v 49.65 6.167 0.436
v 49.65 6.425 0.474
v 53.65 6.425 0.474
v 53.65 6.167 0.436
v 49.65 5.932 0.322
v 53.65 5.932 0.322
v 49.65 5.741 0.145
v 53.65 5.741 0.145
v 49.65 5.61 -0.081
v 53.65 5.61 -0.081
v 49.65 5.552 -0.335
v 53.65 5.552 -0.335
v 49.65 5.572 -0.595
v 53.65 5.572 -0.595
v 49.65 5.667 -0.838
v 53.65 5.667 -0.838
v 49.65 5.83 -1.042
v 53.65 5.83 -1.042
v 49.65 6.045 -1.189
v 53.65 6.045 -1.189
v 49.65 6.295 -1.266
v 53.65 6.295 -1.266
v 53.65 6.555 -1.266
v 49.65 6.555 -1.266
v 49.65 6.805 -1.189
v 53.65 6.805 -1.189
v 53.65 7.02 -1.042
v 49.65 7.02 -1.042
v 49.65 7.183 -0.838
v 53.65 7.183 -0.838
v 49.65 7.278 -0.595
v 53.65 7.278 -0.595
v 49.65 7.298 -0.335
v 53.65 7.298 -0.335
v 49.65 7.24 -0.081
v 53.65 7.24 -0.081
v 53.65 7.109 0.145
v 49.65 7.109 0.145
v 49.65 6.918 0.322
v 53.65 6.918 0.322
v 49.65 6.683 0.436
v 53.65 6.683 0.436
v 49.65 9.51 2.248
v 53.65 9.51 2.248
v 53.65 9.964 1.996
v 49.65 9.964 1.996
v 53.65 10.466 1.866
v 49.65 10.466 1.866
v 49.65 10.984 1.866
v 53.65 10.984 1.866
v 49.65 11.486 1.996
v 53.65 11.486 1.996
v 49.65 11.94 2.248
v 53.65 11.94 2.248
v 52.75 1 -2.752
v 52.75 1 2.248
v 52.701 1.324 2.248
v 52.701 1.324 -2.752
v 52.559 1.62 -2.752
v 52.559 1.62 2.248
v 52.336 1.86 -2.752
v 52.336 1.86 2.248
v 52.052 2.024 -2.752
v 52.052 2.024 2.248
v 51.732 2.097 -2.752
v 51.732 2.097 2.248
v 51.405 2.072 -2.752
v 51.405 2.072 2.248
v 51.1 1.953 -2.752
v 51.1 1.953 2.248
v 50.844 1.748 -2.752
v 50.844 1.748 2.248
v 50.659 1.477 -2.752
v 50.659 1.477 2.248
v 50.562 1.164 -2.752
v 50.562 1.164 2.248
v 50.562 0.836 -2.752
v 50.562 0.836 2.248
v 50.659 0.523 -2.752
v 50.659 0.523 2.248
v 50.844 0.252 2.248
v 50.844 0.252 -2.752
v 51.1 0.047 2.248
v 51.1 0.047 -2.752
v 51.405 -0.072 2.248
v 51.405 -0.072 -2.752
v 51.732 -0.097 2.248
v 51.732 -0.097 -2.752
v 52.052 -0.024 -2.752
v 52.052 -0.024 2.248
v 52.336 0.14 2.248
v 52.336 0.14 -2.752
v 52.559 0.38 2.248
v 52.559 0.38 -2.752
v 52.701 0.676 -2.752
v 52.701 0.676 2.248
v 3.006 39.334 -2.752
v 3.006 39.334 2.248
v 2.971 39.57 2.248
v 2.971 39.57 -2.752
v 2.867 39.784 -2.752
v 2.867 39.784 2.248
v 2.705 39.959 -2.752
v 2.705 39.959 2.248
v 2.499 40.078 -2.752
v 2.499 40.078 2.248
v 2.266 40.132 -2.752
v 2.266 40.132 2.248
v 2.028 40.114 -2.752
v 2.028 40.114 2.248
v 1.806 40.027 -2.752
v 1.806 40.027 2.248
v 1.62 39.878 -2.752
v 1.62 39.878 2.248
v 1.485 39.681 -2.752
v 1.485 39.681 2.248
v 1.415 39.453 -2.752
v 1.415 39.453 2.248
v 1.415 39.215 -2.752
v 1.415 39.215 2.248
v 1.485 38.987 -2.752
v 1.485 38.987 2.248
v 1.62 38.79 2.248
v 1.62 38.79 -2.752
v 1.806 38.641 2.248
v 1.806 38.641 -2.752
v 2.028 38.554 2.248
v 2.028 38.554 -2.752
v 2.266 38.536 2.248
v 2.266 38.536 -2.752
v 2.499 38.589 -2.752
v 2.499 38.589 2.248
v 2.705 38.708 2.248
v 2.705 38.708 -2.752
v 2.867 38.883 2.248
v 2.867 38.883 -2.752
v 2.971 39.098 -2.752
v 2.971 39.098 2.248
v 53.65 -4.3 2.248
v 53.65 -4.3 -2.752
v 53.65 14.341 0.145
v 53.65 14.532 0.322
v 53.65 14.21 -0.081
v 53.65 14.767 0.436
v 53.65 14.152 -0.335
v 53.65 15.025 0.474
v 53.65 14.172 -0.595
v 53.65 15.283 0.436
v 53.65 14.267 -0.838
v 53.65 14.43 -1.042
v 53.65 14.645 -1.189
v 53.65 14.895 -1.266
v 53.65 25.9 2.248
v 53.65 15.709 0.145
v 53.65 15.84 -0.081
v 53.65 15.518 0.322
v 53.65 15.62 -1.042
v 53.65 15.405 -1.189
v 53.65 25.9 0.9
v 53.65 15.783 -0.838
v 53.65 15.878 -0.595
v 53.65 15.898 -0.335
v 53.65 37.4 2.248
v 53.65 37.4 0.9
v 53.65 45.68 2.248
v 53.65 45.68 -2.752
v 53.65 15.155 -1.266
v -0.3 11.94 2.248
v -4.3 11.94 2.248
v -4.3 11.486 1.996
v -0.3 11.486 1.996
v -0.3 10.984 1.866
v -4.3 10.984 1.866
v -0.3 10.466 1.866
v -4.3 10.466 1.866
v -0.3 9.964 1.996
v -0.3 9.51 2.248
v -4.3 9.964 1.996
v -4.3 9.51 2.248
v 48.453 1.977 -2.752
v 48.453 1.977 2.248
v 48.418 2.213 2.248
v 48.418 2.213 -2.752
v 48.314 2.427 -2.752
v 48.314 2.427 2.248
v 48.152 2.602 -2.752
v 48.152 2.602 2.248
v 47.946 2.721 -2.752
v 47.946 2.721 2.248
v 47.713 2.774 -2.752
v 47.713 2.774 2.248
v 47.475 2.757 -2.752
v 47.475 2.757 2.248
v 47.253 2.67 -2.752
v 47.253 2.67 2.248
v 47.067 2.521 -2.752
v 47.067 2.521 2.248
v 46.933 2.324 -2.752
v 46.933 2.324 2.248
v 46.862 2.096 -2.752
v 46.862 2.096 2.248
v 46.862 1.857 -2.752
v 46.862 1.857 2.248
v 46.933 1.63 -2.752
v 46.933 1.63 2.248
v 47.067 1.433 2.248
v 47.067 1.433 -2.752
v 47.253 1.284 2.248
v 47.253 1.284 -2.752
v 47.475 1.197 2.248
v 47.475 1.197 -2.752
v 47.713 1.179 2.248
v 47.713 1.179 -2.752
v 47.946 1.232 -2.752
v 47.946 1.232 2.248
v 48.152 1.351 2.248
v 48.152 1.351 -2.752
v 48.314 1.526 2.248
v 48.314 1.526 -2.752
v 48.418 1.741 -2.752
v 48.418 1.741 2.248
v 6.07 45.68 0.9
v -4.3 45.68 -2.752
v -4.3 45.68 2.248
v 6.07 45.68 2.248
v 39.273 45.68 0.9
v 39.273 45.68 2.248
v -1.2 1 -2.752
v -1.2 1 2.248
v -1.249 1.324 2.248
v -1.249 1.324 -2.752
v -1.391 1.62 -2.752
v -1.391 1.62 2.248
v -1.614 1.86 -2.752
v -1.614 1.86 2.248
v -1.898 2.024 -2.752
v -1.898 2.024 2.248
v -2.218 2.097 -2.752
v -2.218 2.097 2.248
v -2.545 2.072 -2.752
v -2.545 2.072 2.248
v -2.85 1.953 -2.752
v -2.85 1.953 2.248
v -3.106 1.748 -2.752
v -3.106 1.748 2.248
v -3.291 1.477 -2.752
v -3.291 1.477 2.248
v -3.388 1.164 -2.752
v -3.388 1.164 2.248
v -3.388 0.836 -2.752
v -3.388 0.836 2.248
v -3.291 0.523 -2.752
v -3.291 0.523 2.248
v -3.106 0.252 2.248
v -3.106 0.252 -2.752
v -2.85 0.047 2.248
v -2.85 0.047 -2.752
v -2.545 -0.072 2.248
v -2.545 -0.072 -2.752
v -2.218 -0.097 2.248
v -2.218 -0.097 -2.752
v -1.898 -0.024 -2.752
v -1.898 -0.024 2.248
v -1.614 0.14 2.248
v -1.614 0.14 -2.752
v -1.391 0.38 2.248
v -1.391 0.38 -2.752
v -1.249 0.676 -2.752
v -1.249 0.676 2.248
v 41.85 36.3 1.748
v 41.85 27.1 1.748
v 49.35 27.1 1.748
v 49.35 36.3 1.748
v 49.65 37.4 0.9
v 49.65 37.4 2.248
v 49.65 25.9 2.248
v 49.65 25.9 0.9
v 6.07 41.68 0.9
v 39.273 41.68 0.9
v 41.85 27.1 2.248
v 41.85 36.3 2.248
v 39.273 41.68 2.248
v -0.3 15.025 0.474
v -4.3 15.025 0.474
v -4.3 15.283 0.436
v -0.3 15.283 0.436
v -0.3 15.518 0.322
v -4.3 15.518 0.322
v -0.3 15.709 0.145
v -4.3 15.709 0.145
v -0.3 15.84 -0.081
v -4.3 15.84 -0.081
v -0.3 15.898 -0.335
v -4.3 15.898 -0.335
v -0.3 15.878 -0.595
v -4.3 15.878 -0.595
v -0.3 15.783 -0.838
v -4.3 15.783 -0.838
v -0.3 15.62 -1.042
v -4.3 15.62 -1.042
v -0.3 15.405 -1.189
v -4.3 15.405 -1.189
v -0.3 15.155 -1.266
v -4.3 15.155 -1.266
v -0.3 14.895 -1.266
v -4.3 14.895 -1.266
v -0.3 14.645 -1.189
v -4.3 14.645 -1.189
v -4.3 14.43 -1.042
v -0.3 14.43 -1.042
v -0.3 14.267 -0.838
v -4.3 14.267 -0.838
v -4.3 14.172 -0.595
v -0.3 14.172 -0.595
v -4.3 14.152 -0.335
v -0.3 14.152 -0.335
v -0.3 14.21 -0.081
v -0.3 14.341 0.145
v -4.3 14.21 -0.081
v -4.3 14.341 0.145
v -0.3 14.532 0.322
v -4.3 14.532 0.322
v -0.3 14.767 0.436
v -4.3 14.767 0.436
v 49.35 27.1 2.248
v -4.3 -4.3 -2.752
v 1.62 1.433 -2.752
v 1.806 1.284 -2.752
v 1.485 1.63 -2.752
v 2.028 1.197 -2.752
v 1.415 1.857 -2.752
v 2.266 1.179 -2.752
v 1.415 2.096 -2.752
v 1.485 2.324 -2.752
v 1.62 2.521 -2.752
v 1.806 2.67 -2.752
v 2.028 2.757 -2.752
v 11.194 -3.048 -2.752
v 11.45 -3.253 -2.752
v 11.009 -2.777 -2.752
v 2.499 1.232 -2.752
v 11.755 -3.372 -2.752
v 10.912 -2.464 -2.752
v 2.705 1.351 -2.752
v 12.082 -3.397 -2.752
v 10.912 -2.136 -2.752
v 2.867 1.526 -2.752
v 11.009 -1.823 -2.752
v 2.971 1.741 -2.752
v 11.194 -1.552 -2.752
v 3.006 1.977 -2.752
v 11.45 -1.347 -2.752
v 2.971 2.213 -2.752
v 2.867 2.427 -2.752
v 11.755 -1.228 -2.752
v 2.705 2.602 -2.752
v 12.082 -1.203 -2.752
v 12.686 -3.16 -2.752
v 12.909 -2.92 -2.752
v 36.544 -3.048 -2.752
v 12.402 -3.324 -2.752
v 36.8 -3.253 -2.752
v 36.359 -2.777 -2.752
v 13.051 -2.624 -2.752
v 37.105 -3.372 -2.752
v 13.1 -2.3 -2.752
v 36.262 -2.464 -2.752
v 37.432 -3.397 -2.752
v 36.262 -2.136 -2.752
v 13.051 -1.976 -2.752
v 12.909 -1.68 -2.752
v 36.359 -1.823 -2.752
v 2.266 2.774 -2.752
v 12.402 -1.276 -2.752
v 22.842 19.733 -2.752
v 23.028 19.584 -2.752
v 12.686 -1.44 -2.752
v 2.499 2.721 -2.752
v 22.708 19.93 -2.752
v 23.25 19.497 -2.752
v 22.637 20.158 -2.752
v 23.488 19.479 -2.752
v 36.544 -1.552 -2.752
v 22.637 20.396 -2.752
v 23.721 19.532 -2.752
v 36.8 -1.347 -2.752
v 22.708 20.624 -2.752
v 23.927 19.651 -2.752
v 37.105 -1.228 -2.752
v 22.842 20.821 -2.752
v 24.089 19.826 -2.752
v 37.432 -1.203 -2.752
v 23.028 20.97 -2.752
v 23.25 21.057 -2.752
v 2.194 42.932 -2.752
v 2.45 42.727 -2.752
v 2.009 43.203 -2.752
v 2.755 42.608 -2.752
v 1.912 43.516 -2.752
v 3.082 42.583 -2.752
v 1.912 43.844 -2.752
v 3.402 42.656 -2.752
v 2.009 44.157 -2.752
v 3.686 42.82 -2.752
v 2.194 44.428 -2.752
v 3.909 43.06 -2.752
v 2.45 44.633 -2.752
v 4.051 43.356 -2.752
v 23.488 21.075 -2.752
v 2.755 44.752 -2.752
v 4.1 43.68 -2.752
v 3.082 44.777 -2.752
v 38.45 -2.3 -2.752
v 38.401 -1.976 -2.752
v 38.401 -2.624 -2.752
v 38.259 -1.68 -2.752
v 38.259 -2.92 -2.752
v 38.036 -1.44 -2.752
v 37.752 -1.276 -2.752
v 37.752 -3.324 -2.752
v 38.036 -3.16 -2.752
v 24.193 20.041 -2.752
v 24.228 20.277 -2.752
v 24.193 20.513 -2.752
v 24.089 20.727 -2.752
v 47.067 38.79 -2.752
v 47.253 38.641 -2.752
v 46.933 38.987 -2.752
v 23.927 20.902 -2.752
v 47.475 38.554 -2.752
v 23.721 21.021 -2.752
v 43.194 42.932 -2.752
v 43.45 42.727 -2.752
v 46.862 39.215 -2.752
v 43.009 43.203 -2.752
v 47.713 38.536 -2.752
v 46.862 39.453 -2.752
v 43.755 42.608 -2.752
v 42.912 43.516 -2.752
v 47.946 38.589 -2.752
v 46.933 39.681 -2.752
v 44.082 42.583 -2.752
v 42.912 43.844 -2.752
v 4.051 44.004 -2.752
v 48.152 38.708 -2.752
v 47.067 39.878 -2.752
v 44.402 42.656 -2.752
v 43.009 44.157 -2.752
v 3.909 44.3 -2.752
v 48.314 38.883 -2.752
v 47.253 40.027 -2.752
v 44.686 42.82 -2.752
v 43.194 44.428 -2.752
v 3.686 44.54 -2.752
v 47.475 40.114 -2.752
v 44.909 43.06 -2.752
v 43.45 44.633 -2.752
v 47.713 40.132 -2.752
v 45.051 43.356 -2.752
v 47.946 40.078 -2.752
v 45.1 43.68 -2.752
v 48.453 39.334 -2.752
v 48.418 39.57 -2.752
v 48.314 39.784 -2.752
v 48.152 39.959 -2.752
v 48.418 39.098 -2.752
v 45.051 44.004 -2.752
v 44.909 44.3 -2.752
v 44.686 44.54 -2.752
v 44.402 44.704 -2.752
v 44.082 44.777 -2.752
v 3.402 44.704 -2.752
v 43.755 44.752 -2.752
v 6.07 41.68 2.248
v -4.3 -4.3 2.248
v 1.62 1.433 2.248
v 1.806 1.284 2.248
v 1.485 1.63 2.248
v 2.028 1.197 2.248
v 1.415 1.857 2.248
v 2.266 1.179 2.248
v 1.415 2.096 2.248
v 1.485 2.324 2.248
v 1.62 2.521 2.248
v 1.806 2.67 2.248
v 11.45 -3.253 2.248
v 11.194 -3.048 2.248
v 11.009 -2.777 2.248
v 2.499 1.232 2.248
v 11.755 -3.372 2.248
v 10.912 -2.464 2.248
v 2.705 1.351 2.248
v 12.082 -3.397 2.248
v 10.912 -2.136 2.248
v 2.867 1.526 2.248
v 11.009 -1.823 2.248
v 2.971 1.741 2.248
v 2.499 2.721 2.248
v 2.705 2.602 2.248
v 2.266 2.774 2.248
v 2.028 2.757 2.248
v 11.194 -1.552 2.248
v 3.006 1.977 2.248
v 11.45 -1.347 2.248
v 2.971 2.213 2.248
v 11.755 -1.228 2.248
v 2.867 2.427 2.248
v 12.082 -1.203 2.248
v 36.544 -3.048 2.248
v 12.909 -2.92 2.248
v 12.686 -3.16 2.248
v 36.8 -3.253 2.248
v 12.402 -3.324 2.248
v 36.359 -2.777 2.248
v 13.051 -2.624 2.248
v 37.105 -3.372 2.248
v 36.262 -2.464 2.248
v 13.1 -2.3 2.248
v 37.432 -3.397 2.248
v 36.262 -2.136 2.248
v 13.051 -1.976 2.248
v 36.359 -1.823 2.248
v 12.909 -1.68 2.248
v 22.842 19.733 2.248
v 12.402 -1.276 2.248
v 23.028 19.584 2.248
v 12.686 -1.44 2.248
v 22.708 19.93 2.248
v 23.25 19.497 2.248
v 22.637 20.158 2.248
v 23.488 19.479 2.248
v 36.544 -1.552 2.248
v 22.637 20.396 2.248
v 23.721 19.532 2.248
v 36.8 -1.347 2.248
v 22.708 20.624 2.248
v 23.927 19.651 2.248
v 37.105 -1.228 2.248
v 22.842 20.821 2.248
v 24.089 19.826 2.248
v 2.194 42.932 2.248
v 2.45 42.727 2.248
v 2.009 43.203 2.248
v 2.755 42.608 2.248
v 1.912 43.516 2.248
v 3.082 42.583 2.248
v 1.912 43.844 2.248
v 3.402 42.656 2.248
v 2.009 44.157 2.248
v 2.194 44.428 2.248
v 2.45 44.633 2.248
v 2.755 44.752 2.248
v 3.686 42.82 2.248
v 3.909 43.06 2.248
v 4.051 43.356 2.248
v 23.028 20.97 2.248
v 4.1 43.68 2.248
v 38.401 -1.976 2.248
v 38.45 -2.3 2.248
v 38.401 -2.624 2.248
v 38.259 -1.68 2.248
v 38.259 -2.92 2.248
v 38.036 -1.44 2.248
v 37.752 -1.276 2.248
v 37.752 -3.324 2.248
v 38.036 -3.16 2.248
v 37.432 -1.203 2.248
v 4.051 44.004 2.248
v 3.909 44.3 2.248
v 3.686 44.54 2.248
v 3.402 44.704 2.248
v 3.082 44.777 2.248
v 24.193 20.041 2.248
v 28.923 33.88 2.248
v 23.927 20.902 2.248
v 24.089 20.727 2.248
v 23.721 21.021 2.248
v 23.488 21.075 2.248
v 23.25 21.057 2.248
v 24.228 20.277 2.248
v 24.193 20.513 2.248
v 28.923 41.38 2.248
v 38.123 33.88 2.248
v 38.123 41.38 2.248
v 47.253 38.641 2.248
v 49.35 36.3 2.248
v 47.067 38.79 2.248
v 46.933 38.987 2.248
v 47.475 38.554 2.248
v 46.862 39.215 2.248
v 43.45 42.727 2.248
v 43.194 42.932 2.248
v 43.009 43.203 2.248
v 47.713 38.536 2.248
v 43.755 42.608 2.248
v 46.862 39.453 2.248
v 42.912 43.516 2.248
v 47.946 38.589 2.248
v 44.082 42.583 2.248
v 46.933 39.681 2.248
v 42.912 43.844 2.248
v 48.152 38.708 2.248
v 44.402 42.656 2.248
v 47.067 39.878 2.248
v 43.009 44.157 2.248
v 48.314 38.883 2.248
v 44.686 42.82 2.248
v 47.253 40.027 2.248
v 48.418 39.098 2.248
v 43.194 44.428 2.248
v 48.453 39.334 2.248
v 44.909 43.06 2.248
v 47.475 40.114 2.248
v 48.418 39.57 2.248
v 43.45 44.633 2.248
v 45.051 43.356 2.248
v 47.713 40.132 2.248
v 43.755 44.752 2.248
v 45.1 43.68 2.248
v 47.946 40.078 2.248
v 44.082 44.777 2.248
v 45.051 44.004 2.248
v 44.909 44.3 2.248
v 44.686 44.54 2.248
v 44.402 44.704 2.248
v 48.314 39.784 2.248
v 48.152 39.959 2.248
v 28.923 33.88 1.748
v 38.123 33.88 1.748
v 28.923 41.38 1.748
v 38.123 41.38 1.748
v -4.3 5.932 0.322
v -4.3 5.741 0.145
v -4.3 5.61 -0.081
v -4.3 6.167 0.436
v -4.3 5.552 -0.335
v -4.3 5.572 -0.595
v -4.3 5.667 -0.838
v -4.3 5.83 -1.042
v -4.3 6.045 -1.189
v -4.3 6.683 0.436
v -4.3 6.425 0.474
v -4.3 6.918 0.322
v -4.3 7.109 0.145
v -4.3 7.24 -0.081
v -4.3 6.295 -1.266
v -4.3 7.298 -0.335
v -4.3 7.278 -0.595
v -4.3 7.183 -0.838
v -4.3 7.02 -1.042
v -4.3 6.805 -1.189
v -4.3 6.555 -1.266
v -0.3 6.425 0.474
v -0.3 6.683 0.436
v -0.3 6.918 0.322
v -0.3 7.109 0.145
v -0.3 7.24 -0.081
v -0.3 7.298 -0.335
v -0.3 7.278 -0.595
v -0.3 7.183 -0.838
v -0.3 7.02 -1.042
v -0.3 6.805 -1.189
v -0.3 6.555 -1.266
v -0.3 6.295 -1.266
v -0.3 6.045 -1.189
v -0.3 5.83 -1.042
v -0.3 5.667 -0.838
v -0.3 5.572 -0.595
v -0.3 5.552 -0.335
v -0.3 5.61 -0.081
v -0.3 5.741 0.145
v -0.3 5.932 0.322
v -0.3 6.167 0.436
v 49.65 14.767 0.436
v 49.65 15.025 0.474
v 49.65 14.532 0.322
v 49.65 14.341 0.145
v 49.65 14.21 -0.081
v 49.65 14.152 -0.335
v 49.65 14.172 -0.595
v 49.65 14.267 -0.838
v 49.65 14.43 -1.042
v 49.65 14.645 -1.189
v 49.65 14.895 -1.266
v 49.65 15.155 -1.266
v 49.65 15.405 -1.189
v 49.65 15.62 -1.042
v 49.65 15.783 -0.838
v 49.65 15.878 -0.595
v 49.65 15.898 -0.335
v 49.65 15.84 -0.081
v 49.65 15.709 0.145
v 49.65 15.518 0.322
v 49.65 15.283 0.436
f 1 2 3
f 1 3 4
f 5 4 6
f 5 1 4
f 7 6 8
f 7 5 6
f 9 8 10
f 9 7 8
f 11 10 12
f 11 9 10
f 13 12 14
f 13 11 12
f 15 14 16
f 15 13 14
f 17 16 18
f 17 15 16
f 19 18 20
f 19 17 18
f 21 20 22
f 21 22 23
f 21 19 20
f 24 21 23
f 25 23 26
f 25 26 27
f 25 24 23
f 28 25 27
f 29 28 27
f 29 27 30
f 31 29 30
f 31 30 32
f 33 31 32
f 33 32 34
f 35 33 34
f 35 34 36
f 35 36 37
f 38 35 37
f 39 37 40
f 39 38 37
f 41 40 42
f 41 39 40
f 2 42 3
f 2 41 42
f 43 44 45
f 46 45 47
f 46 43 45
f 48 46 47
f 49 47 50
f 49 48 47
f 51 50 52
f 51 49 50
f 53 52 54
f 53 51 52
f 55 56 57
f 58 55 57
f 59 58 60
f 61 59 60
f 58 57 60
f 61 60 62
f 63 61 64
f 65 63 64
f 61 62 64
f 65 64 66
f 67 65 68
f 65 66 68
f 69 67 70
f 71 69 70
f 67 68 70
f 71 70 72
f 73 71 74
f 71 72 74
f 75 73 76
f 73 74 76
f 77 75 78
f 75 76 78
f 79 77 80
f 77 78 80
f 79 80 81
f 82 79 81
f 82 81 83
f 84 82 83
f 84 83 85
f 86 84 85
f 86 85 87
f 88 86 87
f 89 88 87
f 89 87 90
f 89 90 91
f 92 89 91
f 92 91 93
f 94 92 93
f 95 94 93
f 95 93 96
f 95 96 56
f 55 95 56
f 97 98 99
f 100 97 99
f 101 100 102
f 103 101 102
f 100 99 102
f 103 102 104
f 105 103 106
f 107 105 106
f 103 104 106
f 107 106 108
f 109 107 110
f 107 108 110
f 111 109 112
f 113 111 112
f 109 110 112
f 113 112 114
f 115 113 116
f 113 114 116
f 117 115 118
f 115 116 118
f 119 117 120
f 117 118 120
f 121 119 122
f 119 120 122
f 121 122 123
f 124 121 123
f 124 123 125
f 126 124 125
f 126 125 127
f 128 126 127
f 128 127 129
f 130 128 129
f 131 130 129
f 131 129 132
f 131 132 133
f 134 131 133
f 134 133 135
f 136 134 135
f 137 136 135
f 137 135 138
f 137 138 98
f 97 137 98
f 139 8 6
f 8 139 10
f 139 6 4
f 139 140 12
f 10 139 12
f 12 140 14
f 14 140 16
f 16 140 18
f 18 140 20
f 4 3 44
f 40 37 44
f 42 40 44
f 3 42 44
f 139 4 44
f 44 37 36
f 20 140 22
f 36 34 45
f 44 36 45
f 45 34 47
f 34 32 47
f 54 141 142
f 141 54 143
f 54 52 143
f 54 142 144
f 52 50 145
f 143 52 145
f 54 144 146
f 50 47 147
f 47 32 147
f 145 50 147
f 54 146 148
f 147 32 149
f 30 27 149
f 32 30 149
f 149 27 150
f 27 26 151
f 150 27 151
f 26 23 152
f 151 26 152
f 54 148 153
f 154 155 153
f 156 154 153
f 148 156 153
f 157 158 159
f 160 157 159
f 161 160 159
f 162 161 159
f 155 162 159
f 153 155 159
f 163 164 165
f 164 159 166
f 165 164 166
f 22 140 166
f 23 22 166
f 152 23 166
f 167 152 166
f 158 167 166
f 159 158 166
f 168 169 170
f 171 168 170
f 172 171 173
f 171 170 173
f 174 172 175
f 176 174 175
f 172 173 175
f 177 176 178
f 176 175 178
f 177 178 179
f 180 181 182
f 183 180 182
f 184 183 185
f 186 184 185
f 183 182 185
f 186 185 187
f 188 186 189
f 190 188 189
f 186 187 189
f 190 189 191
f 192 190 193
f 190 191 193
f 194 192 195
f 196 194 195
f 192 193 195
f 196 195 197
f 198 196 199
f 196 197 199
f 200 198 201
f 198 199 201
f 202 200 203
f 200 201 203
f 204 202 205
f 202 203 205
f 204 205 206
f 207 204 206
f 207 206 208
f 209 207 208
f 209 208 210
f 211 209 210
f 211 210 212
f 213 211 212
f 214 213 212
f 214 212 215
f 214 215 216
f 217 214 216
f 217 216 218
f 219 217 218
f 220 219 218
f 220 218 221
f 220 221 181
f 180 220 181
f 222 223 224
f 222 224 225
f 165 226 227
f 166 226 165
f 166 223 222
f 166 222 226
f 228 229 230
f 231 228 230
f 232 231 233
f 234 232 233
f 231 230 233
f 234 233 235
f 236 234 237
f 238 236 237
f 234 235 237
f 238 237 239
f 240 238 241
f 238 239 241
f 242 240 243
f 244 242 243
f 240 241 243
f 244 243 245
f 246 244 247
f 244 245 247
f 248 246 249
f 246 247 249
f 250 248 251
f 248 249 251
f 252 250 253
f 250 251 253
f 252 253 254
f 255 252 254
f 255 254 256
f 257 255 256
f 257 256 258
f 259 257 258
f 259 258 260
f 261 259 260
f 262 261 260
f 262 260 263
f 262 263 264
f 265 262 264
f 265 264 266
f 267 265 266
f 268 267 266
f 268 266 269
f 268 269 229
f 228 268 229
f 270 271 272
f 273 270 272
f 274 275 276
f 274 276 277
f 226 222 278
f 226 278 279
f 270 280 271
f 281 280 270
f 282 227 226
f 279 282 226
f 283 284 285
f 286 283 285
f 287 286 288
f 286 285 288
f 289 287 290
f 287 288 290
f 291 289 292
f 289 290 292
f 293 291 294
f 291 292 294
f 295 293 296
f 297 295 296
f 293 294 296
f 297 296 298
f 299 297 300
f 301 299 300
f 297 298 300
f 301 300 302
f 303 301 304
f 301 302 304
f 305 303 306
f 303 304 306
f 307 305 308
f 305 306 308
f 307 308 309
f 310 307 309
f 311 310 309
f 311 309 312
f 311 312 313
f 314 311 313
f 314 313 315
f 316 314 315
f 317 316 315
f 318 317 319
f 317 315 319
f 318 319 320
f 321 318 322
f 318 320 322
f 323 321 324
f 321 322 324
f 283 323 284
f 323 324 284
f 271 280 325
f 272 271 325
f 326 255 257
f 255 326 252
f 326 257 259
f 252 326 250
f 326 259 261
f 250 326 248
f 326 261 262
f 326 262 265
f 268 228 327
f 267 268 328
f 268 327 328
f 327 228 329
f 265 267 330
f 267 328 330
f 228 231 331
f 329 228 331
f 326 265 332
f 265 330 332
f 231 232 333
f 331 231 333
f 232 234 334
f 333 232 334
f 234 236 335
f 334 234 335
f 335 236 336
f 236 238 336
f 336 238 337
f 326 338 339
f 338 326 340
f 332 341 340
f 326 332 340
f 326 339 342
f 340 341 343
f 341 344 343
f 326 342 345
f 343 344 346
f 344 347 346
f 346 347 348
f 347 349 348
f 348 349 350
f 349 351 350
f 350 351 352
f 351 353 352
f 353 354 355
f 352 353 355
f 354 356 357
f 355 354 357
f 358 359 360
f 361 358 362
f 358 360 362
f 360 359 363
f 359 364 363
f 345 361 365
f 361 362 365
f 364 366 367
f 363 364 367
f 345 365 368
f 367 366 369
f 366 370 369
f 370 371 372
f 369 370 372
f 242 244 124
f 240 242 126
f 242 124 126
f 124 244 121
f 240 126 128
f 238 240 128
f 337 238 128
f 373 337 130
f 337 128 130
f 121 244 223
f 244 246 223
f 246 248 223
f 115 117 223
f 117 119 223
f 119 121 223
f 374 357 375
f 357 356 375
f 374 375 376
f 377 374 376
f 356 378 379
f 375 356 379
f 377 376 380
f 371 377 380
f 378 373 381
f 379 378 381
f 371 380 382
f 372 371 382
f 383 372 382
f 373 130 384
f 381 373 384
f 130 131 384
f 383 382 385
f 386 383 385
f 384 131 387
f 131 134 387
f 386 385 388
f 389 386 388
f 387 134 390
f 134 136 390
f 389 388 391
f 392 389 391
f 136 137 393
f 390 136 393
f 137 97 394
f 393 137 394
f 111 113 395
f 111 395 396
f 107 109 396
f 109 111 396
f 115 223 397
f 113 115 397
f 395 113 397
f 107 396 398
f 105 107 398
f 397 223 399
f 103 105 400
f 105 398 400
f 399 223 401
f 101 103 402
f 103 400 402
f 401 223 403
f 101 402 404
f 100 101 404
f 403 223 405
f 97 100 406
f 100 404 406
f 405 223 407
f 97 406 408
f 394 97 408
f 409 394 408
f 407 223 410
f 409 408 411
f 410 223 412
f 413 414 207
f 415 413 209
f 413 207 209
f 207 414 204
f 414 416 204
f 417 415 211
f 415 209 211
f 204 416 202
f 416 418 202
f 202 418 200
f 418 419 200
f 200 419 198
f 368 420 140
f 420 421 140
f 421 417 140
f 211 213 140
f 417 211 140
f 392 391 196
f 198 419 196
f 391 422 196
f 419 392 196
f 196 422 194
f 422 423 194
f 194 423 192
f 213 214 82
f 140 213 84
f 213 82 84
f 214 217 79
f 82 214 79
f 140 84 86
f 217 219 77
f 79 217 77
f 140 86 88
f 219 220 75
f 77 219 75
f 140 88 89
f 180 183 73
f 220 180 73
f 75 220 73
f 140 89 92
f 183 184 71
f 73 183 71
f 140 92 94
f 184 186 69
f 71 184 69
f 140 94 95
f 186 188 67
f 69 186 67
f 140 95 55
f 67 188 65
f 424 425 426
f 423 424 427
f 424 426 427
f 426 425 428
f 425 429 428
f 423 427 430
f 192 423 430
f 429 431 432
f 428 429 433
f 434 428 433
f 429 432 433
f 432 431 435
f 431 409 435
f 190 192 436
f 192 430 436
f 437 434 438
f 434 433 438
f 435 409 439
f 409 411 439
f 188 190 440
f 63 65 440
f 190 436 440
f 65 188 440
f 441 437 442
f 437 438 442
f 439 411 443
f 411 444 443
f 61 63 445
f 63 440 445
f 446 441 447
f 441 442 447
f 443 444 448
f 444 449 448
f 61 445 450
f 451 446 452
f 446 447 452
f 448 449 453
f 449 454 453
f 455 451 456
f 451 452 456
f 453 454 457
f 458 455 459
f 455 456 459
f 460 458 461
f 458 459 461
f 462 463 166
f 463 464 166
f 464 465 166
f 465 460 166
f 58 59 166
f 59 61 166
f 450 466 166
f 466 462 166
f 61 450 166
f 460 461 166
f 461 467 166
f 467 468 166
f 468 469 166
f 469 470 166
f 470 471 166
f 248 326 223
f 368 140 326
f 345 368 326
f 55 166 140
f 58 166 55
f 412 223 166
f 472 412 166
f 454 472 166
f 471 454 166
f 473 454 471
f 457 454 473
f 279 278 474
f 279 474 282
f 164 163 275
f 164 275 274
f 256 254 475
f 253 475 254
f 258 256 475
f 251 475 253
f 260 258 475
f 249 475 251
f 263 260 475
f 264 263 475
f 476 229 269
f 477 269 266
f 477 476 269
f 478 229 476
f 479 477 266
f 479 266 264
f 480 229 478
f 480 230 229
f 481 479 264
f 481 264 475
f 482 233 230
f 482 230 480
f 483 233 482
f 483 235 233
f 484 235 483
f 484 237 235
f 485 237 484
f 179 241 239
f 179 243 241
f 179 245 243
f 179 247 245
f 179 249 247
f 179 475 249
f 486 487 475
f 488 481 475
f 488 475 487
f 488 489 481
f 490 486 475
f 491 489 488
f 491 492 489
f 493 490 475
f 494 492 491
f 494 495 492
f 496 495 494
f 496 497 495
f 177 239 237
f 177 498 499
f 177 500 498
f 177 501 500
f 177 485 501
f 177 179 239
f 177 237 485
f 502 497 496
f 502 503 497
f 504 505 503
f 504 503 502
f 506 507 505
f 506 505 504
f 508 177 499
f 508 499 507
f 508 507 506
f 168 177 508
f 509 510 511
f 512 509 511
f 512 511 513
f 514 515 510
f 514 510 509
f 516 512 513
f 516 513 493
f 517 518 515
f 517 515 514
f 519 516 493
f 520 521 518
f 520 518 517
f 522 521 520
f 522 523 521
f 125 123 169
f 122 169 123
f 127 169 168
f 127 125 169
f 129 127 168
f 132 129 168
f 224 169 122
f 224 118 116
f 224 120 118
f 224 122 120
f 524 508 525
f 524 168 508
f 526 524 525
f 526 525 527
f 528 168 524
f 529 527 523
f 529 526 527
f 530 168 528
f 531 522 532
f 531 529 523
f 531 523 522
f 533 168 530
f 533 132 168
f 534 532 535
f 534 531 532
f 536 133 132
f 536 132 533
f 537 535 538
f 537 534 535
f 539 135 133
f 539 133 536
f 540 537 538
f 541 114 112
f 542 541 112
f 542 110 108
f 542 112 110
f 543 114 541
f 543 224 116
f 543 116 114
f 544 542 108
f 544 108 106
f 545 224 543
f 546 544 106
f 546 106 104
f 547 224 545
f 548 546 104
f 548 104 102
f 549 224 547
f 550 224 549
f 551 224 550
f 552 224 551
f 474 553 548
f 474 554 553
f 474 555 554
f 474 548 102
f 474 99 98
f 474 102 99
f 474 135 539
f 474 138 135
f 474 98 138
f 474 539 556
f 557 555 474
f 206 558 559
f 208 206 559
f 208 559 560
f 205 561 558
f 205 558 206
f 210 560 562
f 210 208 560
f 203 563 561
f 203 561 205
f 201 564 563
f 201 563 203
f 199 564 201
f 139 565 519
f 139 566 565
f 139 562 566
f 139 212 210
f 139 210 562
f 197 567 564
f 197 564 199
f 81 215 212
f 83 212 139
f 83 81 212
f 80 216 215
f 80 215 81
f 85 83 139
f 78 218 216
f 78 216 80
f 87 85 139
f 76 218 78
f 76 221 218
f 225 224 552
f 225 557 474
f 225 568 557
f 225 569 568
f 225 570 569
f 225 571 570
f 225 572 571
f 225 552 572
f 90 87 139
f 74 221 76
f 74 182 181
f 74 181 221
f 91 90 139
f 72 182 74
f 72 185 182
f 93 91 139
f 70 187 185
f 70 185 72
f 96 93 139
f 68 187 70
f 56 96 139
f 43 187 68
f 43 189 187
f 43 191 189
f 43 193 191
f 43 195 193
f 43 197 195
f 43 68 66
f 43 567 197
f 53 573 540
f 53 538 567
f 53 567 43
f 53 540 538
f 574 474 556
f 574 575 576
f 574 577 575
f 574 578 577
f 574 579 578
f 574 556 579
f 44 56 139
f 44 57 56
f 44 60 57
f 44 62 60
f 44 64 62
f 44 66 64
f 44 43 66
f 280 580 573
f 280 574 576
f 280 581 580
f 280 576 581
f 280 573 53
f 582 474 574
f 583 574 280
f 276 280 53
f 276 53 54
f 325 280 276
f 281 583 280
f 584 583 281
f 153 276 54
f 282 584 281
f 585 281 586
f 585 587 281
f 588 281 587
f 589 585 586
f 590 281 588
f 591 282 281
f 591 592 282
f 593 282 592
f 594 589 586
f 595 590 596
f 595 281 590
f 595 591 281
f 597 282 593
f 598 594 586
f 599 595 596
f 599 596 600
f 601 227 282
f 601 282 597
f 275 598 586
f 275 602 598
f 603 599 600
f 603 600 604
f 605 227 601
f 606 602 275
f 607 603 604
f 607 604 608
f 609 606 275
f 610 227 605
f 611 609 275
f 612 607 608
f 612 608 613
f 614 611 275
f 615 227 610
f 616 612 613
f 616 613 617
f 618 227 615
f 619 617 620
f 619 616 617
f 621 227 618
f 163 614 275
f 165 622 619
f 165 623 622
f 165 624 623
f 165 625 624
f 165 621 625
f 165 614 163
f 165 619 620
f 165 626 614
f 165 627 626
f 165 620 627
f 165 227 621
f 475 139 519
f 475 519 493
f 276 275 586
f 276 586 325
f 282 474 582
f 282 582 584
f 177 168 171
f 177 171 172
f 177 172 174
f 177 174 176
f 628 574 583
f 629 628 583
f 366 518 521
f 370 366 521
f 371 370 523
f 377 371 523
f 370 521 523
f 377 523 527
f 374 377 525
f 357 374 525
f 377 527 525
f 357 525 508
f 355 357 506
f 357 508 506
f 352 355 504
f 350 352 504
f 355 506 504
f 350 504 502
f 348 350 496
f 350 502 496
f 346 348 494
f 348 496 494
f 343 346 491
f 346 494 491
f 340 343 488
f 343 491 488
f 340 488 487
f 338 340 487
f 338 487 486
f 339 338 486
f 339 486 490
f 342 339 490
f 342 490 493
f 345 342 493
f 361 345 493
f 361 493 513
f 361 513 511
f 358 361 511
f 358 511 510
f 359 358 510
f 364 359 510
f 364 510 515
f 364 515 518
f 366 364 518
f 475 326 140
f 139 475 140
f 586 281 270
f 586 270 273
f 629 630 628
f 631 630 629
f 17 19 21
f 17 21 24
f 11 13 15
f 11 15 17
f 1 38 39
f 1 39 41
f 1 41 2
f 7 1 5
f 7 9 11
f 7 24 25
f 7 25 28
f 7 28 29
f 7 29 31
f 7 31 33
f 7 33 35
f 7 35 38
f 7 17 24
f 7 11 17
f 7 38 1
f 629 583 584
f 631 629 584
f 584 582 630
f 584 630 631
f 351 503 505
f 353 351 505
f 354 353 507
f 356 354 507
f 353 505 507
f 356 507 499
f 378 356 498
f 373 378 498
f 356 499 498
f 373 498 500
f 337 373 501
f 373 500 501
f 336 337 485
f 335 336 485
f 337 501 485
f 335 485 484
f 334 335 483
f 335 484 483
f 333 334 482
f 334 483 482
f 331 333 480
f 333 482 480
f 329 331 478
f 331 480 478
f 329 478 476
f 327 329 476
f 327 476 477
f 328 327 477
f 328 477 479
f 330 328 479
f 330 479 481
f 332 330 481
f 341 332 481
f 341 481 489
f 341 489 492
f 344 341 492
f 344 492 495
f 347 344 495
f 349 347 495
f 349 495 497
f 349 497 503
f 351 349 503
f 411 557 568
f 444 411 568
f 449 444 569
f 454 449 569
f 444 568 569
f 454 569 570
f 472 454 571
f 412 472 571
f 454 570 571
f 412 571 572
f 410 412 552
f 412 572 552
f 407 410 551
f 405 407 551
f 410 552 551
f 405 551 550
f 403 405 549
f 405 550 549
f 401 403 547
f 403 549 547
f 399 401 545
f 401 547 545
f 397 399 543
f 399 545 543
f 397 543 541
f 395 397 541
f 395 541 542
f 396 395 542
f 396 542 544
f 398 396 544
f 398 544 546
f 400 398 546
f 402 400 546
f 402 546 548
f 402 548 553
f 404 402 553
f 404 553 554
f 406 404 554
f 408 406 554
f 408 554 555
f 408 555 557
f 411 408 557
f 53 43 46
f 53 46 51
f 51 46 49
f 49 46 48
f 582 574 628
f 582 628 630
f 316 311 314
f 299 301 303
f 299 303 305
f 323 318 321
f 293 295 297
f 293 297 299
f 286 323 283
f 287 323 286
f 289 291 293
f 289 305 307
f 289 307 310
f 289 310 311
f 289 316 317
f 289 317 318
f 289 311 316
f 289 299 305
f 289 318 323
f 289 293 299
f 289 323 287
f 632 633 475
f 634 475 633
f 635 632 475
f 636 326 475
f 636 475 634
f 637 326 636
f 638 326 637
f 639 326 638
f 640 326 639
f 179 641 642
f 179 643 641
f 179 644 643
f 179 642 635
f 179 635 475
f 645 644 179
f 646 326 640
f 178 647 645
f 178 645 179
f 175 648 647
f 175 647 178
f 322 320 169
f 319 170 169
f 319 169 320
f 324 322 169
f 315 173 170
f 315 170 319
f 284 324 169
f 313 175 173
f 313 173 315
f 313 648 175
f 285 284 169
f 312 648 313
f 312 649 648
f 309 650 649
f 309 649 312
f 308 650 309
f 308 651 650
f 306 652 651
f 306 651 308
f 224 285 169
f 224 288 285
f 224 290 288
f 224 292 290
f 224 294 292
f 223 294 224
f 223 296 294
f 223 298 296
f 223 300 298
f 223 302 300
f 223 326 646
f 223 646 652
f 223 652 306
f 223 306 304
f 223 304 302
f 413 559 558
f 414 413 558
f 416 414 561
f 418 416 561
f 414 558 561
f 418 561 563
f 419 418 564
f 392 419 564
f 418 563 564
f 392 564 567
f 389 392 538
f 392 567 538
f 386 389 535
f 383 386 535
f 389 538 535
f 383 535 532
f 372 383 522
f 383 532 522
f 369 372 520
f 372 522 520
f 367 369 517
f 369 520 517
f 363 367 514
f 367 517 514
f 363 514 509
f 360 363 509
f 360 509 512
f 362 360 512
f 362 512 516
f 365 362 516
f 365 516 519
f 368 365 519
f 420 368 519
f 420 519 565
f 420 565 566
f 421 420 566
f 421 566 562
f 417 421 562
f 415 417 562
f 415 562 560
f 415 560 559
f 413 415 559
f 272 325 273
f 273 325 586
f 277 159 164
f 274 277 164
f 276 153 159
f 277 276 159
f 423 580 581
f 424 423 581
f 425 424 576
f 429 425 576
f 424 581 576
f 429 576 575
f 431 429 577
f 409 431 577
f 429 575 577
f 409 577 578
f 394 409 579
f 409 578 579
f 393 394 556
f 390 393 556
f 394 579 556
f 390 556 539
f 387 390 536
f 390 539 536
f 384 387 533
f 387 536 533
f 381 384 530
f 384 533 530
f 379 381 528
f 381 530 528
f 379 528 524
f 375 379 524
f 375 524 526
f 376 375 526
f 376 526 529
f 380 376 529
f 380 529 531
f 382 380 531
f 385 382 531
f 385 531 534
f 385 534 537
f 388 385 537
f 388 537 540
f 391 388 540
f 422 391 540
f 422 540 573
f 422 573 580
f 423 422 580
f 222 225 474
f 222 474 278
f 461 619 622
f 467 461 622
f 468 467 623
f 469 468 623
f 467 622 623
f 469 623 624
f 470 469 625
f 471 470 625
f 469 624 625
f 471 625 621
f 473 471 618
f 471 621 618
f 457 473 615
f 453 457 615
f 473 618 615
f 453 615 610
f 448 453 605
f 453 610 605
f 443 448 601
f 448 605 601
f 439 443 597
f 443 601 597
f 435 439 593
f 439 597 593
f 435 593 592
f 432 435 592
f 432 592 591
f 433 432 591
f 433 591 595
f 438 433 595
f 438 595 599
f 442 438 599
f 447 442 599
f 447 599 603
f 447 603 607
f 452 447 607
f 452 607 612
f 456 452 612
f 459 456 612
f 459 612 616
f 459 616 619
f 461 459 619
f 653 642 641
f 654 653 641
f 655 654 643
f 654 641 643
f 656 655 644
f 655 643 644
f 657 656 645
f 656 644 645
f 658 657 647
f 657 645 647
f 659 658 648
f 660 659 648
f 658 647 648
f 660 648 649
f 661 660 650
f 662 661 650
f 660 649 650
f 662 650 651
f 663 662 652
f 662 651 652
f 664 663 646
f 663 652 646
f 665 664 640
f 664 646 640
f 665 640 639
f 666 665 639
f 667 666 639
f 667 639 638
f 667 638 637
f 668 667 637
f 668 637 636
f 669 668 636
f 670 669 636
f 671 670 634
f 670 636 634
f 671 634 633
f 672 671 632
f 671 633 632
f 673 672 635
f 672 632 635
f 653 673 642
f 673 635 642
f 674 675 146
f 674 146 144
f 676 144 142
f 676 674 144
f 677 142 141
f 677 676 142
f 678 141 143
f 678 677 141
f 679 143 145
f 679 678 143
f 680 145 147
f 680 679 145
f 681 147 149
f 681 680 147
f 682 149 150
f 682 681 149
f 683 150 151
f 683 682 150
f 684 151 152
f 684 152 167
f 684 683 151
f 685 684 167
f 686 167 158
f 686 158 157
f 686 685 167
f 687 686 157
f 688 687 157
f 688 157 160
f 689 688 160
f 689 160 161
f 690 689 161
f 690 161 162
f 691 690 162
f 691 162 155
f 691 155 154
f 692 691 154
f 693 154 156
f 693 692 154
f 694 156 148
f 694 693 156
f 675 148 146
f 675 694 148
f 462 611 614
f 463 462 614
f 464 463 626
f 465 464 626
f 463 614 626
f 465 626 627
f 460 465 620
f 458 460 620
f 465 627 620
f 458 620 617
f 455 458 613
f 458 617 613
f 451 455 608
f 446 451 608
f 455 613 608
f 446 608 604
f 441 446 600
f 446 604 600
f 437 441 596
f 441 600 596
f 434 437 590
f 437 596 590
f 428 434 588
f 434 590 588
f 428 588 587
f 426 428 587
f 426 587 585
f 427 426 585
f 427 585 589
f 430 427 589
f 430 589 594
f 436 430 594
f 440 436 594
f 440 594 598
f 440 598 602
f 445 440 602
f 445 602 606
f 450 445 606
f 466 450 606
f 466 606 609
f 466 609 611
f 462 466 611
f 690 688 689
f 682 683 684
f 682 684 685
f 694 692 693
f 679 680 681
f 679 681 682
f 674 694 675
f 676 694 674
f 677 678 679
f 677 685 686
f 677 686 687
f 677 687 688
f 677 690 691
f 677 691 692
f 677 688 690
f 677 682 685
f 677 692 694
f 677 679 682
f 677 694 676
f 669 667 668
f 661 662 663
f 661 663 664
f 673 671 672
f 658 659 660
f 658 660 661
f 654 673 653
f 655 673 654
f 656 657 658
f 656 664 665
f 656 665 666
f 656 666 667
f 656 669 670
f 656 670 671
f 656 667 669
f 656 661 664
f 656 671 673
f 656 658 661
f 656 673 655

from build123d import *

# Parameters (mm, degrees)
MAIN_STOCK_START                 = -2.751909566
SKETCH_1_W                       = 57.95
SKETCH_1_H                       = 49.98
MAIN_STOCK_DEPTH                 = 5
SKETCH_2_R                       = 1.1
FRAME_6XD2P2_THROUGH_DEPTH       = 71.63982517
SKETCH_3_R                       = 0.8
PCB_5XD1P6_M2_THROUGH_DEPTH      = 71.63982517
SKETCH_4_R                       = 2.05
SMA_L_CENTER_MATCHING_ARC_DEPTH  = 4
SKETCH_5_R                       = 0.875
SMA_L_LOWER_2XD1P75_BLIND4_DEPTH = 4
SMA_R_CENTER_MATCHING_ARC_START  = -4
SKETCH_6_R                       = 2.05
SMA_R_CENTER_MATCHING_ARC_DEPTH  = 4
SMA_R_LOWER_2XD1P75_BLIND4_START = -4
SKETCH_7_R                       = 0.875
SMA_R_LOWER_2XD1P75_BLIND4_DEPTH = 4
SKETCH_8_W                       = 6.7
SKETCH_8_H                       = 11.5
RIGHT_TYPEC_WINDOW_LOWER_DEPTH   = 4
SKETCH_9_W                       = 33.203
SKETCH_9_H                       = 6.7
REAR_WINDOW_LOWER_DEPTH          = 4
SKETCH_10_W                      = 7.5
SKETCH_10_H                      = 9.2
TYPEC_BOTTOM_RECESS_A_DEPTH      = 0.5
SKETCH_11_W                      = 9.2
SKETCH_11_H                      = 7.5
TYPEC_BOTTOM_RECESS_B_DEPTH      = 0.5


with BuildPart() as part:
    # 草图1 → Main_Stock (new body)
    with BuildSketch(Plane.XY.offset(MAIN_STOCK_START)):
        with Locations((24.675, 20.69)):
            Rectangle(SKETCH_1_W, SKETCH_1_H)
    extrude(amount=MAIN_STOCK_DEPTH)

    # 草图2 → Frame_6xD2p2_Through (cut, through all)
    with BuildSketch(Plane.XY.offset(2.248090434)):
        with Locations((-2.3, 1)):
            Circle(SKETCH_2_R)
        with Locations((51.65, 1)):
            Circle(SKETCH_2_R)
        with Locations((12, -2.3)):
            Circle(SKETCH_2_R)
        with Locations((37.35, -2.3)):
            Circle(SKETCH_2_R)
        with Locations((3, 43.68)):
            Circle(SKETCH_2_R)
        with Locations((44, 43.68)):
            Circle(SKETCH_2_R)
    extrude(amount=-FRAME_6XD2P2_THROUGH_DEPTH, mode=Mode.SUBTRACT)

    # 草图3 → PCB_5xD1p6_M2_Through (cut, through all)
    with BuildSketch(Plane.XY.offset(2.248090434)):
        with Locations((23.428293927, 20.276755792)):
            Circle(SKETCH_3_R)
        with Locations((2.206251763, 39.333791606)):
            Circle(SKETCH_3_R)
        with Locations((47.653340917, 39.333791606)):
            Circle(SKETCH_3_R)
        with Locations((47.653340917, 1.976720232)):
            Circle(SKETCH_3_R)
        with Locations((2.206251763, 1.976720232)):
            Circle(SKETCH_3_R)
    extrude(amount=-PCB_5XD1P6_M2_THROUGH_DEPTH, mode=Mode.SUBTRACT)

    # 草图4 → SMA_L_Center_Matching_Arc (cut)
    with BuildSketch(Plane.ZY.offset(4.3)):
        with Locations((3.899496327, 10.725)):
            Circle(SKETCH_4_R)
    extrude(amount=-SMA_L_CENTER_MATCHING_ARC_DEPTH, mode=Mode.SUBTRACT)

    # 草图5 → SMA_L_Lower_2xD1p75_Blind4 (cut)
    with BuildSketch(Plane.ZY.offset(4.3)):
        with Locations((-0.400503673, 6.425)):
            Circle(SKETCH_5_R)
        with Locations((-0.400503673, 15.025)):
            Circle(SKETCH_5_R)
    extrude(amount=-SMA_L_LOWER_2XD1P75_BLIND4_DEPTH, mode=Mode.SUBTRACT)

    # 草图6 → SMA_R_Center_Matching_Arc (cut)
    with BuildSketch(Plane(origin=(53.65, 0, 0), x_dir=(0, 0, -1), z_dir=(1, 0, 0)).offset(SMA_R_CENTER_MATCHING_ARC_START)):
        with Locations((-3.899496327, 10.725)):
            Circle(SKETCH_6_R)
    extrude(amount=SMA_R_CENTER_MATCHING_ARC_DEPTH, mode=Mode.SUBTRACT)

    # 草图7 → SMA_R_Lower_2xD1p75_Blind4 (cut)
    with BuildSketch(Plane(origin=(53.65, 0, 0), x_dir=(0, 0, -1), z_dir=(1, 0, 0)).offset(SMA_R_LOWER_2XD1P75_BLIND4_START)):
        with Locations(Location((0.400503673, 6.425, 0), (0, 0, 180))):
            Circle(SKETCH_7_R)
        with Locations(Location((0.400503673, 15.025, 0), (0, 0, 180))):
            Circle(SKETCH_7_R)
    extrude(amount=SMA_R_LOWER_2XD1P75_BLIND4_DEPTH, mode=Mode.SUBTRACT)

    # 草图8 → Right_TypeC_Window_Lower (cut)
    with BuildSketch(Plane(origin=(53.65, 0, 0), x_dir=(0, 0, -1), z_dir=(1, 0, 0))):
        with Locations((-4.25, 31.65)):
            Rectangle(SKETCH_8_W, SKETCH_8_H)
    extrude(amount=-RIGHT_TYPEC_WINDOW_LOWER_DEPTH, mode=Mode.SUBTRACT)

    # 草图9 → Rear_Window_Lower (cut)
    with BuildSketch(Plane(origin=(0, 45.68, 0), x_dir=(1, 0, 0), z_dir=(0, 1, 0))):
        with Locations((22.6715, -4.25)):
            Rectangle(SKETCH_9_W, SKETCH_9_H)
    extrude(amount=-REAR_WINDOW_LOWER_DEPTH, mode=Mode.SUBTRACT)

    # 草图10 → TypeC_Bottom_Recess_A (cut)
    with BuildSketch(Plane.XY.offset(2.248090434)):
        with Locations((45.6, 31.7)):
            Rectangle(SKETCH_10_W, SKETCH_10_H)
    extrude(amount=-TYPEC_BOTTOM_RECESS_A_DEPTH, mode=Mode.SUBTRACT)

    # 草图11 → TypeC_Bottom_Recess_B (cut)
    with BuildSketch(Plane.XY.offset(2.248090434)):
        with Locations((33.523, 37.63)):
            Rectangle(SKETCH_11_W, SKETCH_11_H)
    extrude(amount=-TYPEC_BOTTOM_RECESS_B_DEPTH, mode=Mode.SUBTRACT)


solid = part.part
